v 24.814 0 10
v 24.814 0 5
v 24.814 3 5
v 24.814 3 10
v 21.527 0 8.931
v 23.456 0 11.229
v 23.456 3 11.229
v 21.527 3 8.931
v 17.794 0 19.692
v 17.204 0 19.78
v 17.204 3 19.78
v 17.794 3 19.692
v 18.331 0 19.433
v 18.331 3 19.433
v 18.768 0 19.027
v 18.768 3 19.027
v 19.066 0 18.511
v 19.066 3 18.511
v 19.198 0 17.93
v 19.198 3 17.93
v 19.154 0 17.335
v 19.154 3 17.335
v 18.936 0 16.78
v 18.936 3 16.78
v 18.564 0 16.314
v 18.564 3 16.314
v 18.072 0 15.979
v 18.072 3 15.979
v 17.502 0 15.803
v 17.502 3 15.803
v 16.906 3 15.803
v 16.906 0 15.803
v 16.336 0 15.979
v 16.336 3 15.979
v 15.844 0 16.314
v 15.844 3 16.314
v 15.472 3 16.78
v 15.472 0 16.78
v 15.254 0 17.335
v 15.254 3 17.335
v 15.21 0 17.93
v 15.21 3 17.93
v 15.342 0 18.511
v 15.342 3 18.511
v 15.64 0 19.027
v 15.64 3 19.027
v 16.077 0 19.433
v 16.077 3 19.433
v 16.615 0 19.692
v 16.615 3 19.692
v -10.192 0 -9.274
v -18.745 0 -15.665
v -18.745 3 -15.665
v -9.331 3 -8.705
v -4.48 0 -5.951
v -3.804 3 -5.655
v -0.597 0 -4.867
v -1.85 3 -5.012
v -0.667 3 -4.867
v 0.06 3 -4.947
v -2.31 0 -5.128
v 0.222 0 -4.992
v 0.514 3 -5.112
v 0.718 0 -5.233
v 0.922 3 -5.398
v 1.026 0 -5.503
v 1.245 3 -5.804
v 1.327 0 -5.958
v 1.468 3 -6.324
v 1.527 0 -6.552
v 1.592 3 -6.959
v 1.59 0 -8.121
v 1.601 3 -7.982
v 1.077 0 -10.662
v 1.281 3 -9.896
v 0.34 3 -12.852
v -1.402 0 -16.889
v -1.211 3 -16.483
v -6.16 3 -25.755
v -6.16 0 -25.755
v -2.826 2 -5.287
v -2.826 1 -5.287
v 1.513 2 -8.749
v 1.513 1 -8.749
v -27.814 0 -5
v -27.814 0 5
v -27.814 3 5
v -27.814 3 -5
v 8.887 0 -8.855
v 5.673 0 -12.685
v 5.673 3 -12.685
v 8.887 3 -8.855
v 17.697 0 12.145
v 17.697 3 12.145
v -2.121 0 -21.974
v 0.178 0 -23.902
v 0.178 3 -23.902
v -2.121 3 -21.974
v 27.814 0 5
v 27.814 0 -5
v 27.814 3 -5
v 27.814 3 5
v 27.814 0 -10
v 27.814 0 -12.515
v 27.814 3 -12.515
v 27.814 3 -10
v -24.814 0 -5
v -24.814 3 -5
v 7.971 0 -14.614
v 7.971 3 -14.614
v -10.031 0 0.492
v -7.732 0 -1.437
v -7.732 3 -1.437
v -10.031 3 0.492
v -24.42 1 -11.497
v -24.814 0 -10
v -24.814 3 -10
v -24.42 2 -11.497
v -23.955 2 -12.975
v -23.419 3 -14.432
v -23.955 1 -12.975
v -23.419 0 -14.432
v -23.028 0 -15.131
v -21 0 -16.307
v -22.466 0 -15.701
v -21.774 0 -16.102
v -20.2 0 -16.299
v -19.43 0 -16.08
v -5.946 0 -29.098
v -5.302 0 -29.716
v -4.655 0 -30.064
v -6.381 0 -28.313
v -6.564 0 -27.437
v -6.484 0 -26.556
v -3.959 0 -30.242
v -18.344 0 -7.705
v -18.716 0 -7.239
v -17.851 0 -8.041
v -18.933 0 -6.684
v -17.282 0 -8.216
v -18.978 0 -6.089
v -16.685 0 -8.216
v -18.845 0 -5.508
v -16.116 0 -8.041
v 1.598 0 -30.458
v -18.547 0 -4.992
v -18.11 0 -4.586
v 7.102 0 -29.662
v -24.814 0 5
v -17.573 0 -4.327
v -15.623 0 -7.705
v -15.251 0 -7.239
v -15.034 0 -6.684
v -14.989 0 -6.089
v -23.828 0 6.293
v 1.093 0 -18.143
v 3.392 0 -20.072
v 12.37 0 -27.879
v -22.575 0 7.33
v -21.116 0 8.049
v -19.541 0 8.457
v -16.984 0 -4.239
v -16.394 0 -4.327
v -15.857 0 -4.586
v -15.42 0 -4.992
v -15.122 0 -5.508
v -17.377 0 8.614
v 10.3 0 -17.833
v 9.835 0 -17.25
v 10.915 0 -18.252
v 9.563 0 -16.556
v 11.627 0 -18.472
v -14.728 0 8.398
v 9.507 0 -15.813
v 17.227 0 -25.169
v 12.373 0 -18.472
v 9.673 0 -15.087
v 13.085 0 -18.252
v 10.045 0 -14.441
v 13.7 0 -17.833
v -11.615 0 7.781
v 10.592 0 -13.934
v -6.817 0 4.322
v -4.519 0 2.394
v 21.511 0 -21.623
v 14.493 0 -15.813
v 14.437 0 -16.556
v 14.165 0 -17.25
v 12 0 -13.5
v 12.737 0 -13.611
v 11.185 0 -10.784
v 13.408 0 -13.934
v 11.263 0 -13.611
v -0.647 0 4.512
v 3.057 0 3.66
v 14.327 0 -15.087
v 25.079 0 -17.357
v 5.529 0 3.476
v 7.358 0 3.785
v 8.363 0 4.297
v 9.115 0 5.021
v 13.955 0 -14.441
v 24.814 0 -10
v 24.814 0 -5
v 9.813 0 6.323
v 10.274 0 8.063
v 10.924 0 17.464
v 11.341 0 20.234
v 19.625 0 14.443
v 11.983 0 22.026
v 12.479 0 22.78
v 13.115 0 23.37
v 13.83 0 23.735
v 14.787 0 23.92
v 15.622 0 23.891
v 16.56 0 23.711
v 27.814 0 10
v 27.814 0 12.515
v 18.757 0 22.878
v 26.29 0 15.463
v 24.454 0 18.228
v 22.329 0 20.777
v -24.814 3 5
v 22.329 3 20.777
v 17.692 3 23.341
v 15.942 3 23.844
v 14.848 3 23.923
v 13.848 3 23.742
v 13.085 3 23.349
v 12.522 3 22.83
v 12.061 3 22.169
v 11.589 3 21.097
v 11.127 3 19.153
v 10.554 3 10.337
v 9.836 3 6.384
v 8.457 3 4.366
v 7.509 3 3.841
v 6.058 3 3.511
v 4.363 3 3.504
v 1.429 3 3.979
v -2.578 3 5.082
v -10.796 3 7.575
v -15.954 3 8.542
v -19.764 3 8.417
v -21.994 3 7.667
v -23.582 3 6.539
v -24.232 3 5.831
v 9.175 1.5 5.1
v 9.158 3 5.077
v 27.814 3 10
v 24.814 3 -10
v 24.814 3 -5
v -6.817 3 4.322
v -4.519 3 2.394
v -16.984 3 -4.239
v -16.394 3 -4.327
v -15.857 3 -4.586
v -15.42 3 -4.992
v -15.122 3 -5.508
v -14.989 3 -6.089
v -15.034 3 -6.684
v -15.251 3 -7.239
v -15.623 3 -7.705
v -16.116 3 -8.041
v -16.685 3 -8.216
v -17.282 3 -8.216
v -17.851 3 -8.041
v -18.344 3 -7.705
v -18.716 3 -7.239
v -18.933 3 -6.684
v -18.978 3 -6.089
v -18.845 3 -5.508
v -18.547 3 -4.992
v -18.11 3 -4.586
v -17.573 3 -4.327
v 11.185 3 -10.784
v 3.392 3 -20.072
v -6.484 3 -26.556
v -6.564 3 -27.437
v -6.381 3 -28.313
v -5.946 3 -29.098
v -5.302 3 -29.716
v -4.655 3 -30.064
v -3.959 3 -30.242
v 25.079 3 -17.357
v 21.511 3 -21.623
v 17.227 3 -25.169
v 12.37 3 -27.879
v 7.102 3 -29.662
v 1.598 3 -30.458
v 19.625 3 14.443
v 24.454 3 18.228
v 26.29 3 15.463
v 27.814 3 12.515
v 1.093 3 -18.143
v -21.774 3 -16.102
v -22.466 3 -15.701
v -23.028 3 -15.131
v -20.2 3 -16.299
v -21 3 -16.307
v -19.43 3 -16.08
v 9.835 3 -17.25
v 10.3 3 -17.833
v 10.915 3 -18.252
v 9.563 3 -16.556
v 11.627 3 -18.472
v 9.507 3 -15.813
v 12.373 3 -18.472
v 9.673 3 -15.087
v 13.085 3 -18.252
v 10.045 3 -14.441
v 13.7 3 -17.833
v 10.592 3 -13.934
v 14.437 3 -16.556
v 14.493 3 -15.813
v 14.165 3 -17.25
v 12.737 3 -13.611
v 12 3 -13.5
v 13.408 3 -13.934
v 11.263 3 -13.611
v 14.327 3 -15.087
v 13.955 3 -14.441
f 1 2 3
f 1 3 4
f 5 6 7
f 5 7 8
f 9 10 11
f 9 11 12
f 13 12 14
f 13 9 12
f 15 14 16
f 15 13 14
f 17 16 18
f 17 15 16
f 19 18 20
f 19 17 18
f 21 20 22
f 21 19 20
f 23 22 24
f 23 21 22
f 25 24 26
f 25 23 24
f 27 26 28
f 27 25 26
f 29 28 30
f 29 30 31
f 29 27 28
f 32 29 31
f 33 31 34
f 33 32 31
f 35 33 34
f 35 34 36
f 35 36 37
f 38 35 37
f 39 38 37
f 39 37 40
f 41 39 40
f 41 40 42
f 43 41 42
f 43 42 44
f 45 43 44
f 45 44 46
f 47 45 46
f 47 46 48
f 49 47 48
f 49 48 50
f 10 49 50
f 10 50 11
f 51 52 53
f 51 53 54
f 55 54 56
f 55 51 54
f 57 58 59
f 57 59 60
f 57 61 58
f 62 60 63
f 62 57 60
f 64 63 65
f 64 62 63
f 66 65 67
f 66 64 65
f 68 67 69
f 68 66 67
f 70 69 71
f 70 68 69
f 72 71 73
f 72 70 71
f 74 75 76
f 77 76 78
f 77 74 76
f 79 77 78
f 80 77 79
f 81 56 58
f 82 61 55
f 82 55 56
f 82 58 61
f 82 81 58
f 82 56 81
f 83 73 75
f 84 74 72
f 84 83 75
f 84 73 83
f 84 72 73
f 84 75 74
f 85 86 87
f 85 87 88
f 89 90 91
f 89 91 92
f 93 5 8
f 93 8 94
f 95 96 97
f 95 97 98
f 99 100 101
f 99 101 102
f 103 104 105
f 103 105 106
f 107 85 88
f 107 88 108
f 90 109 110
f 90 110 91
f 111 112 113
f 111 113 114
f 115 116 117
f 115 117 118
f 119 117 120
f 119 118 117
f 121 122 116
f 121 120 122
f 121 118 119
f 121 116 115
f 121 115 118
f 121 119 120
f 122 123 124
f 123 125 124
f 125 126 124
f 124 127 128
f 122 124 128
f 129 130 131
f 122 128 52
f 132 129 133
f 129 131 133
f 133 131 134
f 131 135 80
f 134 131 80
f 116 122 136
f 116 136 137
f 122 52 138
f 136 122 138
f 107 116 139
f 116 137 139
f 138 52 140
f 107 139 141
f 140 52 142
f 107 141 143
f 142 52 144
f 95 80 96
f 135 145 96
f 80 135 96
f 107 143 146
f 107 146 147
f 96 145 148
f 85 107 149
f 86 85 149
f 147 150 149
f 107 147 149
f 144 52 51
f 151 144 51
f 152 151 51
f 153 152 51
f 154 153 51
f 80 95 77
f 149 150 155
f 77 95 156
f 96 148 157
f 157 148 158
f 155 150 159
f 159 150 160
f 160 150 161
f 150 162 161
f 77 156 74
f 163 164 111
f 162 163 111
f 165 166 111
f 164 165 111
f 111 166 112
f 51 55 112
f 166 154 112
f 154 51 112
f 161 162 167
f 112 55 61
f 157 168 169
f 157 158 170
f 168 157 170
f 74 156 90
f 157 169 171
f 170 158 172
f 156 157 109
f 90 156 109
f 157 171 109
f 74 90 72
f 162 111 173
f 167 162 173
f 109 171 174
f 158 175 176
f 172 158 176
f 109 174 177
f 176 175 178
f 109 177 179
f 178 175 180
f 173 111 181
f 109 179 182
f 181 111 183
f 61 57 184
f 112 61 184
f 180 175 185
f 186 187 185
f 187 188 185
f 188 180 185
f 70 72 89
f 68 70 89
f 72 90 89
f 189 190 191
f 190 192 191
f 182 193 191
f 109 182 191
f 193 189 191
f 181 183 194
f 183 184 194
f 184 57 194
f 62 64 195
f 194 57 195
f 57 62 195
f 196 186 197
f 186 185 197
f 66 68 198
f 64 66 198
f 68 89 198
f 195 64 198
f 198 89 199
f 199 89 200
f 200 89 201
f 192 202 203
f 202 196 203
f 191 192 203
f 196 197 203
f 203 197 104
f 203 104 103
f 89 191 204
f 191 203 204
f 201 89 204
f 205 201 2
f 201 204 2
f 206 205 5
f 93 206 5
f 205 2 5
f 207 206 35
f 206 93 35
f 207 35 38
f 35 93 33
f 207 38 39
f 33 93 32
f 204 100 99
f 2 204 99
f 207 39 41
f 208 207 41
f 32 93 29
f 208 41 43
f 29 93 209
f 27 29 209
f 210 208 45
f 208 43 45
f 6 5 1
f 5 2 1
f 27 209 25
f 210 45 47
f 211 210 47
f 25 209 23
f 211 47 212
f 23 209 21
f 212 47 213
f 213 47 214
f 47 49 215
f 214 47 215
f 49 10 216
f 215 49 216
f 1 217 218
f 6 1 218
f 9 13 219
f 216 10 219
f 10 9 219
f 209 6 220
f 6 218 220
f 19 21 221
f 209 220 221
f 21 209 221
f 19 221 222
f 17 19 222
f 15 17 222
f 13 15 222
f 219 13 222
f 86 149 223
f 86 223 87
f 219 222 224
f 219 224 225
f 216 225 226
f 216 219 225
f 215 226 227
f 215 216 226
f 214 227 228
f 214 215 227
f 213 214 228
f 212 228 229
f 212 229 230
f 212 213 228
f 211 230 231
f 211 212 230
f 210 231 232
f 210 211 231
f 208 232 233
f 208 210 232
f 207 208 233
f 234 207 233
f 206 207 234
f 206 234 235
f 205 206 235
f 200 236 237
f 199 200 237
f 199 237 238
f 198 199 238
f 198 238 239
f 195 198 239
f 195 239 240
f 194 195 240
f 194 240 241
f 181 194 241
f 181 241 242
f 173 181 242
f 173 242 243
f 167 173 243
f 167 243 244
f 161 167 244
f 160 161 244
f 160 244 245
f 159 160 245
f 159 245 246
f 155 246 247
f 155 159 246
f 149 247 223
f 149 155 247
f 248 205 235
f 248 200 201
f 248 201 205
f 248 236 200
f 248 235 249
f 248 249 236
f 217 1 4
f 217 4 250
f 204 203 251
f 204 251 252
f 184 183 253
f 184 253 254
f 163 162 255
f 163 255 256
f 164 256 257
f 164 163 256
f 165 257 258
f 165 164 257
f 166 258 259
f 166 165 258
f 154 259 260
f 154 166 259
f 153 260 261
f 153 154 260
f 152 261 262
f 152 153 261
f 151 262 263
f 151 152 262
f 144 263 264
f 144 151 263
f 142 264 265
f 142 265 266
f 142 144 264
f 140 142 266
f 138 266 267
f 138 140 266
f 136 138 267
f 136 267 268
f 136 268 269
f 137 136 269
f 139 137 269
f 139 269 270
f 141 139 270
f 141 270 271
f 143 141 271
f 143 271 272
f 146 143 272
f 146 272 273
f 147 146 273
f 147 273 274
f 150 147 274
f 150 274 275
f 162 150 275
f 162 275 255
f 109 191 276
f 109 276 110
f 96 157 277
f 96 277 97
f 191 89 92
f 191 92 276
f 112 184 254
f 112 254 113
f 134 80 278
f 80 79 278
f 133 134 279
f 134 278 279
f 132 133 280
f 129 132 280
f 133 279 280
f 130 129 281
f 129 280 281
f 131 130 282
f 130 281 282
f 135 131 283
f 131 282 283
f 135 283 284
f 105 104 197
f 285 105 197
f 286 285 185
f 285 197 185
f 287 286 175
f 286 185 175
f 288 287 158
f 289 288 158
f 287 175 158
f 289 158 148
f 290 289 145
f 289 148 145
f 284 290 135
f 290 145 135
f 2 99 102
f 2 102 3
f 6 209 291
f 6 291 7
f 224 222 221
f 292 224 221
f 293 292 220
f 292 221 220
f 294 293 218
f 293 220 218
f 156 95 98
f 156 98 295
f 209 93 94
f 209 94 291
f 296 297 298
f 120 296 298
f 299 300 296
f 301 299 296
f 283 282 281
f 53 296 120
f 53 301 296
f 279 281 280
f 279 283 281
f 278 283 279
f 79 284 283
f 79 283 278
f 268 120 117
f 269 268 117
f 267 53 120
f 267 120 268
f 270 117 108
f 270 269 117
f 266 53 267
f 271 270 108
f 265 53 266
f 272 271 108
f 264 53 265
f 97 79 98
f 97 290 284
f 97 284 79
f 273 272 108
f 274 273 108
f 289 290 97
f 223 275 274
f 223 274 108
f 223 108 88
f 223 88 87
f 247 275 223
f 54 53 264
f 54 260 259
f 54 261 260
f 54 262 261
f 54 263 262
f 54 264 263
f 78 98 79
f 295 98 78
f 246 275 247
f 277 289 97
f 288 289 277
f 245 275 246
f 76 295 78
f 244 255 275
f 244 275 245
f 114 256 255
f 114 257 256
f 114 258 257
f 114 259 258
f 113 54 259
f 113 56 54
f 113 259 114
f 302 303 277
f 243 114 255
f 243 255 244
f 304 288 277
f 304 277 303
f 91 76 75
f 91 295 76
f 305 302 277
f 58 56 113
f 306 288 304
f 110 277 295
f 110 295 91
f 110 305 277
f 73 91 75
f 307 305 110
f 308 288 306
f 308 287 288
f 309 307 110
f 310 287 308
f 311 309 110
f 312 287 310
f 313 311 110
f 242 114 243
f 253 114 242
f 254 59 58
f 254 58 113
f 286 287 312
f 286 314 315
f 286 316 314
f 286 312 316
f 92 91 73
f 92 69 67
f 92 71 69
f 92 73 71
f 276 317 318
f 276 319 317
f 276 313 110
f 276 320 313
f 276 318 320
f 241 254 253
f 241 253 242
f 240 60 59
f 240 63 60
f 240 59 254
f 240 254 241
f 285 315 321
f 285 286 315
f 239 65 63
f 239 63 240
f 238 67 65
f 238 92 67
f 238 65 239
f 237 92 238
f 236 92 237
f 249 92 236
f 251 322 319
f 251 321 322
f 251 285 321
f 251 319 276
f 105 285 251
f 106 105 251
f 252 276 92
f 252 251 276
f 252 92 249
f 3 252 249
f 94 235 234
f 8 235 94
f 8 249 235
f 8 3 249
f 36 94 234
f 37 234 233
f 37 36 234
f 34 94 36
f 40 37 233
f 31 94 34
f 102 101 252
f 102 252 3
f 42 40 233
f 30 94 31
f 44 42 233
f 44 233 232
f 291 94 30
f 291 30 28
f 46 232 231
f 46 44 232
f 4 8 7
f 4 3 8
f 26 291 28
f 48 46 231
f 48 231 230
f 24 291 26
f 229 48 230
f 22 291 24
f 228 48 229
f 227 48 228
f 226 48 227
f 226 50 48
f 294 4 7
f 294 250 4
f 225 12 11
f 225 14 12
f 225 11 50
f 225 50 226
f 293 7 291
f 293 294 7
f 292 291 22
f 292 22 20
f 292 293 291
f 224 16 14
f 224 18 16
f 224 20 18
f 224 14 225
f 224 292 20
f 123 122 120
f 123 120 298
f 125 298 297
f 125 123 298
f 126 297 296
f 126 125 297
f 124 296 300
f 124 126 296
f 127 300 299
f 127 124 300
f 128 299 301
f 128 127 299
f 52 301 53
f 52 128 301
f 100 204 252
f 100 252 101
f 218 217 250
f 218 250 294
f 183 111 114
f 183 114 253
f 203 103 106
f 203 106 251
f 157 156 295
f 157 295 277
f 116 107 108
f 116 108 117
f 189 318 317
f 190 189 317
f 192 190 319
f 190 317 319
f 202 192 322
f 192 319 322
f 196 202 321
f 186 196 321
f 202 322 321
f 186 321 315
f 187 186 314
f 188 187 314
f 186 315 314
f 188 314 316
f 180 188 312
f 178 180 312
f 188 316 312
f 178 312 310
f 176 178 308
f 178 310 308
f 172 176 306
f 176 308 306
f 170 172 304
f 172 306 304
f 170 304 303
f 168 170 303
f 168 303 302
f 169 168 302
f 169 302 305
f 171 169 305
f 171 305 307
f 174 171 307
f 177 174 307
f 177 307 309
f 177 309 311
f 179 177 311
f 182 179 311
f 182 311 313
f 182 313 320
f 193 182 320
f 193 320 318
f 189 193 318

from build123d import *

# Parameters (mm, degrees)
CROQUIS1_R                 = 30.5
SALIENTE_EXTRUIR1_DEPTH    = 3
CORTAR_EXTRUIR3_START      = -4
CORTAR_EXTRUIR3_DEPTH      = 4
CORTAR_EXTRUIR6_START      = -10
CROQUIS9_R                 = 2
CORTAR_EXTRUIR6_DEPTH      = 10
REDONDEO1_R                = 3
CROQUIS10_R                = 2.5
CORTAR_EXTRUIR7_DEPTH      = 10
CORTAR_EXTRUIR8_DEPTH      = 44.237715166
CORTAR_EXTRUIR8_DEPTH_BACK = 44.237715166


with BuildPart() as part:
    # Croquis1 → Saliente-Extruir1 (new body)
    with BuildSketch(Plane(origin=(0, 0, 0), x_dir=(1, 0, 0), z_dir=(0, 1, 0))):
        with Locations(Location((0, 0, 0), (0, 0, 270))):
            Circle(CROQUIS1_R)
    extrude(amount=SALIENTE_EXTRUIR1_DEPTH)

    # Croquis5 → Cortar-Extruir3 (cut)
    with BuildSketch(Plane(origin=(0, 3, 0), x_dir=(1, 0, 0), z_dir=(0, 1, 0)).offset(CORTAR_EXTRUIR3_START)):
        with BuildLine():
            Line((28.814059068, 5), (30.087372767, 5))
            ThreePointArc((30.087372767, 5), (29.556634924, 7.526973624), (28.814059068, 10))
            Line((28.814059068, 10), (24.814059068, 10))
            Line((24.814059068, 10), (24.814059068, 5))
            Line((24.814059068, 5), (28.814059068, 5))
        make_face()
        with BuildLine():
            Line((30.087372767, -5), (28.814059068, -5))
            Line((28.814059068, -5), (24.814059068, -5))
            Line((24.814059068, -5), (24.814059068, -10))
            Line((24.814059068, -10), (28.814059068, -10))
            ThreePointArc((28.814059068, -10), (29.556634924, -7.526973624), (30.087372767, -5))
        make_face()
        with BuildLine():
            Line((-24.814059068, 5), (-24.814059068, 10))
            Line((-24.814059068, 10), (-28.814059068, 10))
            ThreePointArc((-28.814059068, 10), (-29.556634924, 7.526973624), (-30.087372767, 5))
            Line((-30.087372767, 5), (-28.814059068, 5))
            Line((-28.814059068, 5), (-24.814059068, 5))
        make_face()
        with BuildLine():
            Line((-28.814059068, -10), (-24.814059068, -10))
            Line((-24.814059068, -10), (-24.814059068, -5))
            Line((-24.814059068, -5), (-28.814059068, -5))
            Line((-28.814059068, -5), (-30.087372767, -5))
            ThreePointArc((-30.087372767, -5), (-29.556634924, -7.526973624), (-28.814059068, -10))
        make_face()
    extrude(amount=CORTAR_EXTRUIR3_DEPTH, mode=Mode.SUBTRACT)

    # Croquis9 → Cortar-Extruir6 (cut)
    with BuildSketch(Plane(origin=(0, 3, 0), x_dir=(1, 0, 0), z_dir=(0, 1, 0)).offset(CORTAR_EXTRUIR6_START)):
        Polygon((5.673284852, 12.685390231), (8.887222901, 8.855168016), (11.18535623, 10.783530845), (7.971418181, 14.613753061), align=None)
        with BuildLine():
            add(Edge.make_bspline(
                [(22.328940845, -20.776631121), (5.973751648, -31.851207958), (22.176782581, 15.835204965), (-18.206868011, -15.807645224), (-24.814059068, -5)],
                knots=[0, 0, 0, 0, 0.445790092, 1, 1, 1, 1], degree=3))
            Line((-24.814059068, -5), (-24.814059068, -10))
            Line((-24.814059068, -10), (-28.814059068, -10))
            ThreePointArc((-28.814059068, -10), (-6.288730728, -29.84462876), (22.328940845, -20.776631121))
        make_face()
        with BuildLine():
            add(Edge.make_bspline(
                [(-18.745320889, 15.664553597), (3.867000935, -2.576496257), (8.094246487, 2.496379136), (-8.307345659, 29.346856869)],
                knots=[0.040527546, 0.040527546, 0.040527546, 0.040527546, 1, 1, 1, 1], degree=3))
            ThreePointArc((-8.307345659, 29.346856869), (-20.930238649, 22.185019948), (-28.814059068, 10))
            Line((-28.814059068, 10), (-24.814059068, 10))
            add(Edge.make_bspline(
                [(-24.814059068, 10), (-24.456478323, 11.504954743), (-23.99064654, 12.985671633), (-23.418905183, 14.432273611)],
                knots=[0.635079884, 0.635079884, 0.635079884, 0.635079884, 0.831813486, 0.831813486, 0.831813486, 0.831813486], degree=3))
            ThreePointArc((-23.418905183, 14.432273611), (-21.393777069, 16.230440533), (-18.745320889, 15.664553597))
        make_face()
        Polygon((-2.120514915, 21.973679104), (1.093423133, 18.143456889), (3.391556462, 20.071819718), (0.177618414, 23.902041933), align=None)
        Polygon((-4.518554854, -2.393615154), (-7.732492903, 1.436607062), (-10.030626232, -0.491755767), (-6.816688183, -4.321977983), align=None)
        Polygon((23.455638465, -11.229310268), (21.527275636, -8.931176939), (17.69705342, -12.145114987), (19.625416249, -14.443248317), align=None)
        with Locations(Location((-16.983501418, 6.238634388, 0), (0, 0, 270))):
            Circle(CROQUIS9_R)
        with Locations(Location((17.204026086, -17.780443199, 0), (0, 0, 270))):
            Circle(CROQUIS9_R)
    extrude(amount=CORTAR_EXTRUIR6_DEPTH, mode=Mode.SUBTRACT)

    # Redondeo1
    redondeo1_edges = [part.edges().sort_by_distance(p)[0] for p in [
        (-8.307345659, 1.5, -29.346856869),
    ]]
    fillet(redondeo1_edges, radius=REDONDEO1_R)

    # Croquis10 → Cortar-Extruir7 (cut)
    with BuildSketch(Plane(origin=(0, 3, 0), x_dir=(1, 0, 0), z_dir=(0, 1, 0))):
        with Locations(Location((12, 16, 0), (0, 0, 270))):
            Circle(CROQUIS10_R)
    extrude(amount=-CORTAR_EXTRUIR7_DEPTH, mode=Mode.SUBTRACT)

    # Croquis11 → Cortar-Extruir8 (cut, two sides: drawn at the far end of the back side and taken through both)
    with BuildSketch(Plane(origin=(0, 3, 0), x_dir=(1, 0, 0), z_dir=(0, 1, 0)).offset(-CORTAR_EXTRUIR8_DEPTH_BACK)):
        with BuildLine():
            Line((30.087372767, 5), (27.814059068, 5))
            Line((27.814059068, 5), (27.814059068, -5))
            Line((27.814059068, -5), (30.087372767, -5))
            ThreePointArc((30.087372767, -5), (30.5, 0), (30.087372767, 5))
        make_face()
        with BuildLine():
            Line((28.814059068, -10), (27.814059068, -10))
            Line((27.814059068, -10), (27.814059068, -12.515115586))
            ThreePointArc((27.814059068, -12.515115586), (28.341972277, -11.268655974), (28.814059068, -10))
        make_face()
        with BuildLine():
            Line((27.814059068, 12.515115586), (27.814059068, 10))
            Line((27.814059068, 10), (28.814059068, 10))
            ThreePointArc((28.814059068, 10), (28.341972277, 11.268655974), (27.814059068, 12.515115586))
        make_face()
        with BuildLine():
            Line((-27.814059068, -5), (-27.814059068, 5))
            Line((-27.814059068, 5), (-30.087372767, 5))
            ThreePointArc((-30.087372767, 5), (-30.5, 0), (-30.087372767, -5))
            Line((-30.087372767, -5), (-27.814059068, -5))
        make_face()
    extrude(amount=CORTAR_EXTRUIR8_DEPTH + CORTAR_EXTRUIR8_DEPTH_BACK, mode=Mode.SUBTRACT)


solid = part.part
